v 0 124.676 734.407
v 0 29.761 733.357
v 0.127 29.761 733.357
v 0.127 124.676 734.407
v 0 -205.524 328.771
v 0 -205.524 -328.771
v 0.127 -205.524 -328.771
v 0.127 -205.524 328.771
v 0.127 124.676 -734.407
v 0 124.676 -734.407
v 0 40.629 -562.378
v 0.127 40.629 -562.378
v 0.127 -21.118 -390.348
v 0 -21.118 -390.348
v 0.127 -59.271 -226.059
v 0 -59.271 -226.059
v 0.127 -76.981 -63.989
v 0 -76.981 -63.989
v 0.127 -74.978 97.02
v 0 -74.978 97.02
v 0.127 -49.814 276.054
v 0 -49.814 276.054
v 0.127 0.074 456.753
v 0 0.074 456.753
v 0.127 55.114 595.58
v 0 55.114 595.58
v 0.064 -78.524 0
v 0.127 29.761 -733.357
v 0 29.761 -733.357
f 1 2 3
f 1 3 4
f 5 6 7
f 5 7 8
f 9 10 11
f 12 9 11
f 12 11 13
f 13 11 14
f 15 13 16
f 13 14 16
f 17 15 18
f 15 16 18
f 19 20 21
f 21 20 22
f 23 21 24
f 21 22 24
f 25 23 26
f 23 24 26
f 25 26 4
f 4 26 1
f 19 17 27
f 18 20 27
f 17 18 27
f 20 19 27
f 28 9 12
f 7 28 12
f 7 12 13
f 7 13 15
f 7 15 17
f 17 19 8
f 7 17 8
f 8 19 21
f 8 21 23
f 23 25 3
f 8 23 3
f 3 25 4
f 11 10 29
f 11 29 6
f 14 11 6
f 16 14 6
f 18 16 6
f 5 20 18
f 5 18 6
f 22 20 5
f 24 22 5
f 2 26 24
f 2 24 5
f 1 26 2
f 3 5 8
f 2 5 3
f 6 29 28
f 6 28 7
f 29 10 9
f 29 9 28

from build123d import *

# Parameters (mm, degrees)
BOSS_EXTRUDE1_DEPTH = 0.127


with BuildPart() as part:
    # Sketch1 → Boss-Extrude1 (new body)
    with BuildSketch(Plane(origin=(0, 0, 0), x_dir=(0, 0, -1), z_dir=(1, 0, 0))):
        with BuildLine():
            Line((734.40708933, 124.676146582), (733.357043785, 29.761237691))
            Line((733.357043785, 29.761237691), (328.770751491, -205.523937709))
            Line((328.770751491, -205.523937709), (-328.770779224, -205.523937708))
            Line((-328.770779224, -205.523937708), (-733.357071518, 29.761237693))
            Line((-733.357071518, 29.761237693), (-734.407163707, 124.676062292))
            add(Edge.make_bspline(
                [(-1.3866e-05, -78.523920986), (-367.203581261, -78.523944347), (-734.407163707, 124.676062292)],
                knots=[0, 0, 0, 1, 1, 1], degree=2))
            add(Edge.make_bspline(
                [(-1.3866e-05, -78.523920986), (367.203545257, -78.523897625), (734.40708933, 124.676146582)],
                knots=[0, 0, 0, 1, 1, 1], degree=2))
        make_face()
    extrude(amount=BOSS_EXTRUDE1_DEPTH)


solid = part.part
